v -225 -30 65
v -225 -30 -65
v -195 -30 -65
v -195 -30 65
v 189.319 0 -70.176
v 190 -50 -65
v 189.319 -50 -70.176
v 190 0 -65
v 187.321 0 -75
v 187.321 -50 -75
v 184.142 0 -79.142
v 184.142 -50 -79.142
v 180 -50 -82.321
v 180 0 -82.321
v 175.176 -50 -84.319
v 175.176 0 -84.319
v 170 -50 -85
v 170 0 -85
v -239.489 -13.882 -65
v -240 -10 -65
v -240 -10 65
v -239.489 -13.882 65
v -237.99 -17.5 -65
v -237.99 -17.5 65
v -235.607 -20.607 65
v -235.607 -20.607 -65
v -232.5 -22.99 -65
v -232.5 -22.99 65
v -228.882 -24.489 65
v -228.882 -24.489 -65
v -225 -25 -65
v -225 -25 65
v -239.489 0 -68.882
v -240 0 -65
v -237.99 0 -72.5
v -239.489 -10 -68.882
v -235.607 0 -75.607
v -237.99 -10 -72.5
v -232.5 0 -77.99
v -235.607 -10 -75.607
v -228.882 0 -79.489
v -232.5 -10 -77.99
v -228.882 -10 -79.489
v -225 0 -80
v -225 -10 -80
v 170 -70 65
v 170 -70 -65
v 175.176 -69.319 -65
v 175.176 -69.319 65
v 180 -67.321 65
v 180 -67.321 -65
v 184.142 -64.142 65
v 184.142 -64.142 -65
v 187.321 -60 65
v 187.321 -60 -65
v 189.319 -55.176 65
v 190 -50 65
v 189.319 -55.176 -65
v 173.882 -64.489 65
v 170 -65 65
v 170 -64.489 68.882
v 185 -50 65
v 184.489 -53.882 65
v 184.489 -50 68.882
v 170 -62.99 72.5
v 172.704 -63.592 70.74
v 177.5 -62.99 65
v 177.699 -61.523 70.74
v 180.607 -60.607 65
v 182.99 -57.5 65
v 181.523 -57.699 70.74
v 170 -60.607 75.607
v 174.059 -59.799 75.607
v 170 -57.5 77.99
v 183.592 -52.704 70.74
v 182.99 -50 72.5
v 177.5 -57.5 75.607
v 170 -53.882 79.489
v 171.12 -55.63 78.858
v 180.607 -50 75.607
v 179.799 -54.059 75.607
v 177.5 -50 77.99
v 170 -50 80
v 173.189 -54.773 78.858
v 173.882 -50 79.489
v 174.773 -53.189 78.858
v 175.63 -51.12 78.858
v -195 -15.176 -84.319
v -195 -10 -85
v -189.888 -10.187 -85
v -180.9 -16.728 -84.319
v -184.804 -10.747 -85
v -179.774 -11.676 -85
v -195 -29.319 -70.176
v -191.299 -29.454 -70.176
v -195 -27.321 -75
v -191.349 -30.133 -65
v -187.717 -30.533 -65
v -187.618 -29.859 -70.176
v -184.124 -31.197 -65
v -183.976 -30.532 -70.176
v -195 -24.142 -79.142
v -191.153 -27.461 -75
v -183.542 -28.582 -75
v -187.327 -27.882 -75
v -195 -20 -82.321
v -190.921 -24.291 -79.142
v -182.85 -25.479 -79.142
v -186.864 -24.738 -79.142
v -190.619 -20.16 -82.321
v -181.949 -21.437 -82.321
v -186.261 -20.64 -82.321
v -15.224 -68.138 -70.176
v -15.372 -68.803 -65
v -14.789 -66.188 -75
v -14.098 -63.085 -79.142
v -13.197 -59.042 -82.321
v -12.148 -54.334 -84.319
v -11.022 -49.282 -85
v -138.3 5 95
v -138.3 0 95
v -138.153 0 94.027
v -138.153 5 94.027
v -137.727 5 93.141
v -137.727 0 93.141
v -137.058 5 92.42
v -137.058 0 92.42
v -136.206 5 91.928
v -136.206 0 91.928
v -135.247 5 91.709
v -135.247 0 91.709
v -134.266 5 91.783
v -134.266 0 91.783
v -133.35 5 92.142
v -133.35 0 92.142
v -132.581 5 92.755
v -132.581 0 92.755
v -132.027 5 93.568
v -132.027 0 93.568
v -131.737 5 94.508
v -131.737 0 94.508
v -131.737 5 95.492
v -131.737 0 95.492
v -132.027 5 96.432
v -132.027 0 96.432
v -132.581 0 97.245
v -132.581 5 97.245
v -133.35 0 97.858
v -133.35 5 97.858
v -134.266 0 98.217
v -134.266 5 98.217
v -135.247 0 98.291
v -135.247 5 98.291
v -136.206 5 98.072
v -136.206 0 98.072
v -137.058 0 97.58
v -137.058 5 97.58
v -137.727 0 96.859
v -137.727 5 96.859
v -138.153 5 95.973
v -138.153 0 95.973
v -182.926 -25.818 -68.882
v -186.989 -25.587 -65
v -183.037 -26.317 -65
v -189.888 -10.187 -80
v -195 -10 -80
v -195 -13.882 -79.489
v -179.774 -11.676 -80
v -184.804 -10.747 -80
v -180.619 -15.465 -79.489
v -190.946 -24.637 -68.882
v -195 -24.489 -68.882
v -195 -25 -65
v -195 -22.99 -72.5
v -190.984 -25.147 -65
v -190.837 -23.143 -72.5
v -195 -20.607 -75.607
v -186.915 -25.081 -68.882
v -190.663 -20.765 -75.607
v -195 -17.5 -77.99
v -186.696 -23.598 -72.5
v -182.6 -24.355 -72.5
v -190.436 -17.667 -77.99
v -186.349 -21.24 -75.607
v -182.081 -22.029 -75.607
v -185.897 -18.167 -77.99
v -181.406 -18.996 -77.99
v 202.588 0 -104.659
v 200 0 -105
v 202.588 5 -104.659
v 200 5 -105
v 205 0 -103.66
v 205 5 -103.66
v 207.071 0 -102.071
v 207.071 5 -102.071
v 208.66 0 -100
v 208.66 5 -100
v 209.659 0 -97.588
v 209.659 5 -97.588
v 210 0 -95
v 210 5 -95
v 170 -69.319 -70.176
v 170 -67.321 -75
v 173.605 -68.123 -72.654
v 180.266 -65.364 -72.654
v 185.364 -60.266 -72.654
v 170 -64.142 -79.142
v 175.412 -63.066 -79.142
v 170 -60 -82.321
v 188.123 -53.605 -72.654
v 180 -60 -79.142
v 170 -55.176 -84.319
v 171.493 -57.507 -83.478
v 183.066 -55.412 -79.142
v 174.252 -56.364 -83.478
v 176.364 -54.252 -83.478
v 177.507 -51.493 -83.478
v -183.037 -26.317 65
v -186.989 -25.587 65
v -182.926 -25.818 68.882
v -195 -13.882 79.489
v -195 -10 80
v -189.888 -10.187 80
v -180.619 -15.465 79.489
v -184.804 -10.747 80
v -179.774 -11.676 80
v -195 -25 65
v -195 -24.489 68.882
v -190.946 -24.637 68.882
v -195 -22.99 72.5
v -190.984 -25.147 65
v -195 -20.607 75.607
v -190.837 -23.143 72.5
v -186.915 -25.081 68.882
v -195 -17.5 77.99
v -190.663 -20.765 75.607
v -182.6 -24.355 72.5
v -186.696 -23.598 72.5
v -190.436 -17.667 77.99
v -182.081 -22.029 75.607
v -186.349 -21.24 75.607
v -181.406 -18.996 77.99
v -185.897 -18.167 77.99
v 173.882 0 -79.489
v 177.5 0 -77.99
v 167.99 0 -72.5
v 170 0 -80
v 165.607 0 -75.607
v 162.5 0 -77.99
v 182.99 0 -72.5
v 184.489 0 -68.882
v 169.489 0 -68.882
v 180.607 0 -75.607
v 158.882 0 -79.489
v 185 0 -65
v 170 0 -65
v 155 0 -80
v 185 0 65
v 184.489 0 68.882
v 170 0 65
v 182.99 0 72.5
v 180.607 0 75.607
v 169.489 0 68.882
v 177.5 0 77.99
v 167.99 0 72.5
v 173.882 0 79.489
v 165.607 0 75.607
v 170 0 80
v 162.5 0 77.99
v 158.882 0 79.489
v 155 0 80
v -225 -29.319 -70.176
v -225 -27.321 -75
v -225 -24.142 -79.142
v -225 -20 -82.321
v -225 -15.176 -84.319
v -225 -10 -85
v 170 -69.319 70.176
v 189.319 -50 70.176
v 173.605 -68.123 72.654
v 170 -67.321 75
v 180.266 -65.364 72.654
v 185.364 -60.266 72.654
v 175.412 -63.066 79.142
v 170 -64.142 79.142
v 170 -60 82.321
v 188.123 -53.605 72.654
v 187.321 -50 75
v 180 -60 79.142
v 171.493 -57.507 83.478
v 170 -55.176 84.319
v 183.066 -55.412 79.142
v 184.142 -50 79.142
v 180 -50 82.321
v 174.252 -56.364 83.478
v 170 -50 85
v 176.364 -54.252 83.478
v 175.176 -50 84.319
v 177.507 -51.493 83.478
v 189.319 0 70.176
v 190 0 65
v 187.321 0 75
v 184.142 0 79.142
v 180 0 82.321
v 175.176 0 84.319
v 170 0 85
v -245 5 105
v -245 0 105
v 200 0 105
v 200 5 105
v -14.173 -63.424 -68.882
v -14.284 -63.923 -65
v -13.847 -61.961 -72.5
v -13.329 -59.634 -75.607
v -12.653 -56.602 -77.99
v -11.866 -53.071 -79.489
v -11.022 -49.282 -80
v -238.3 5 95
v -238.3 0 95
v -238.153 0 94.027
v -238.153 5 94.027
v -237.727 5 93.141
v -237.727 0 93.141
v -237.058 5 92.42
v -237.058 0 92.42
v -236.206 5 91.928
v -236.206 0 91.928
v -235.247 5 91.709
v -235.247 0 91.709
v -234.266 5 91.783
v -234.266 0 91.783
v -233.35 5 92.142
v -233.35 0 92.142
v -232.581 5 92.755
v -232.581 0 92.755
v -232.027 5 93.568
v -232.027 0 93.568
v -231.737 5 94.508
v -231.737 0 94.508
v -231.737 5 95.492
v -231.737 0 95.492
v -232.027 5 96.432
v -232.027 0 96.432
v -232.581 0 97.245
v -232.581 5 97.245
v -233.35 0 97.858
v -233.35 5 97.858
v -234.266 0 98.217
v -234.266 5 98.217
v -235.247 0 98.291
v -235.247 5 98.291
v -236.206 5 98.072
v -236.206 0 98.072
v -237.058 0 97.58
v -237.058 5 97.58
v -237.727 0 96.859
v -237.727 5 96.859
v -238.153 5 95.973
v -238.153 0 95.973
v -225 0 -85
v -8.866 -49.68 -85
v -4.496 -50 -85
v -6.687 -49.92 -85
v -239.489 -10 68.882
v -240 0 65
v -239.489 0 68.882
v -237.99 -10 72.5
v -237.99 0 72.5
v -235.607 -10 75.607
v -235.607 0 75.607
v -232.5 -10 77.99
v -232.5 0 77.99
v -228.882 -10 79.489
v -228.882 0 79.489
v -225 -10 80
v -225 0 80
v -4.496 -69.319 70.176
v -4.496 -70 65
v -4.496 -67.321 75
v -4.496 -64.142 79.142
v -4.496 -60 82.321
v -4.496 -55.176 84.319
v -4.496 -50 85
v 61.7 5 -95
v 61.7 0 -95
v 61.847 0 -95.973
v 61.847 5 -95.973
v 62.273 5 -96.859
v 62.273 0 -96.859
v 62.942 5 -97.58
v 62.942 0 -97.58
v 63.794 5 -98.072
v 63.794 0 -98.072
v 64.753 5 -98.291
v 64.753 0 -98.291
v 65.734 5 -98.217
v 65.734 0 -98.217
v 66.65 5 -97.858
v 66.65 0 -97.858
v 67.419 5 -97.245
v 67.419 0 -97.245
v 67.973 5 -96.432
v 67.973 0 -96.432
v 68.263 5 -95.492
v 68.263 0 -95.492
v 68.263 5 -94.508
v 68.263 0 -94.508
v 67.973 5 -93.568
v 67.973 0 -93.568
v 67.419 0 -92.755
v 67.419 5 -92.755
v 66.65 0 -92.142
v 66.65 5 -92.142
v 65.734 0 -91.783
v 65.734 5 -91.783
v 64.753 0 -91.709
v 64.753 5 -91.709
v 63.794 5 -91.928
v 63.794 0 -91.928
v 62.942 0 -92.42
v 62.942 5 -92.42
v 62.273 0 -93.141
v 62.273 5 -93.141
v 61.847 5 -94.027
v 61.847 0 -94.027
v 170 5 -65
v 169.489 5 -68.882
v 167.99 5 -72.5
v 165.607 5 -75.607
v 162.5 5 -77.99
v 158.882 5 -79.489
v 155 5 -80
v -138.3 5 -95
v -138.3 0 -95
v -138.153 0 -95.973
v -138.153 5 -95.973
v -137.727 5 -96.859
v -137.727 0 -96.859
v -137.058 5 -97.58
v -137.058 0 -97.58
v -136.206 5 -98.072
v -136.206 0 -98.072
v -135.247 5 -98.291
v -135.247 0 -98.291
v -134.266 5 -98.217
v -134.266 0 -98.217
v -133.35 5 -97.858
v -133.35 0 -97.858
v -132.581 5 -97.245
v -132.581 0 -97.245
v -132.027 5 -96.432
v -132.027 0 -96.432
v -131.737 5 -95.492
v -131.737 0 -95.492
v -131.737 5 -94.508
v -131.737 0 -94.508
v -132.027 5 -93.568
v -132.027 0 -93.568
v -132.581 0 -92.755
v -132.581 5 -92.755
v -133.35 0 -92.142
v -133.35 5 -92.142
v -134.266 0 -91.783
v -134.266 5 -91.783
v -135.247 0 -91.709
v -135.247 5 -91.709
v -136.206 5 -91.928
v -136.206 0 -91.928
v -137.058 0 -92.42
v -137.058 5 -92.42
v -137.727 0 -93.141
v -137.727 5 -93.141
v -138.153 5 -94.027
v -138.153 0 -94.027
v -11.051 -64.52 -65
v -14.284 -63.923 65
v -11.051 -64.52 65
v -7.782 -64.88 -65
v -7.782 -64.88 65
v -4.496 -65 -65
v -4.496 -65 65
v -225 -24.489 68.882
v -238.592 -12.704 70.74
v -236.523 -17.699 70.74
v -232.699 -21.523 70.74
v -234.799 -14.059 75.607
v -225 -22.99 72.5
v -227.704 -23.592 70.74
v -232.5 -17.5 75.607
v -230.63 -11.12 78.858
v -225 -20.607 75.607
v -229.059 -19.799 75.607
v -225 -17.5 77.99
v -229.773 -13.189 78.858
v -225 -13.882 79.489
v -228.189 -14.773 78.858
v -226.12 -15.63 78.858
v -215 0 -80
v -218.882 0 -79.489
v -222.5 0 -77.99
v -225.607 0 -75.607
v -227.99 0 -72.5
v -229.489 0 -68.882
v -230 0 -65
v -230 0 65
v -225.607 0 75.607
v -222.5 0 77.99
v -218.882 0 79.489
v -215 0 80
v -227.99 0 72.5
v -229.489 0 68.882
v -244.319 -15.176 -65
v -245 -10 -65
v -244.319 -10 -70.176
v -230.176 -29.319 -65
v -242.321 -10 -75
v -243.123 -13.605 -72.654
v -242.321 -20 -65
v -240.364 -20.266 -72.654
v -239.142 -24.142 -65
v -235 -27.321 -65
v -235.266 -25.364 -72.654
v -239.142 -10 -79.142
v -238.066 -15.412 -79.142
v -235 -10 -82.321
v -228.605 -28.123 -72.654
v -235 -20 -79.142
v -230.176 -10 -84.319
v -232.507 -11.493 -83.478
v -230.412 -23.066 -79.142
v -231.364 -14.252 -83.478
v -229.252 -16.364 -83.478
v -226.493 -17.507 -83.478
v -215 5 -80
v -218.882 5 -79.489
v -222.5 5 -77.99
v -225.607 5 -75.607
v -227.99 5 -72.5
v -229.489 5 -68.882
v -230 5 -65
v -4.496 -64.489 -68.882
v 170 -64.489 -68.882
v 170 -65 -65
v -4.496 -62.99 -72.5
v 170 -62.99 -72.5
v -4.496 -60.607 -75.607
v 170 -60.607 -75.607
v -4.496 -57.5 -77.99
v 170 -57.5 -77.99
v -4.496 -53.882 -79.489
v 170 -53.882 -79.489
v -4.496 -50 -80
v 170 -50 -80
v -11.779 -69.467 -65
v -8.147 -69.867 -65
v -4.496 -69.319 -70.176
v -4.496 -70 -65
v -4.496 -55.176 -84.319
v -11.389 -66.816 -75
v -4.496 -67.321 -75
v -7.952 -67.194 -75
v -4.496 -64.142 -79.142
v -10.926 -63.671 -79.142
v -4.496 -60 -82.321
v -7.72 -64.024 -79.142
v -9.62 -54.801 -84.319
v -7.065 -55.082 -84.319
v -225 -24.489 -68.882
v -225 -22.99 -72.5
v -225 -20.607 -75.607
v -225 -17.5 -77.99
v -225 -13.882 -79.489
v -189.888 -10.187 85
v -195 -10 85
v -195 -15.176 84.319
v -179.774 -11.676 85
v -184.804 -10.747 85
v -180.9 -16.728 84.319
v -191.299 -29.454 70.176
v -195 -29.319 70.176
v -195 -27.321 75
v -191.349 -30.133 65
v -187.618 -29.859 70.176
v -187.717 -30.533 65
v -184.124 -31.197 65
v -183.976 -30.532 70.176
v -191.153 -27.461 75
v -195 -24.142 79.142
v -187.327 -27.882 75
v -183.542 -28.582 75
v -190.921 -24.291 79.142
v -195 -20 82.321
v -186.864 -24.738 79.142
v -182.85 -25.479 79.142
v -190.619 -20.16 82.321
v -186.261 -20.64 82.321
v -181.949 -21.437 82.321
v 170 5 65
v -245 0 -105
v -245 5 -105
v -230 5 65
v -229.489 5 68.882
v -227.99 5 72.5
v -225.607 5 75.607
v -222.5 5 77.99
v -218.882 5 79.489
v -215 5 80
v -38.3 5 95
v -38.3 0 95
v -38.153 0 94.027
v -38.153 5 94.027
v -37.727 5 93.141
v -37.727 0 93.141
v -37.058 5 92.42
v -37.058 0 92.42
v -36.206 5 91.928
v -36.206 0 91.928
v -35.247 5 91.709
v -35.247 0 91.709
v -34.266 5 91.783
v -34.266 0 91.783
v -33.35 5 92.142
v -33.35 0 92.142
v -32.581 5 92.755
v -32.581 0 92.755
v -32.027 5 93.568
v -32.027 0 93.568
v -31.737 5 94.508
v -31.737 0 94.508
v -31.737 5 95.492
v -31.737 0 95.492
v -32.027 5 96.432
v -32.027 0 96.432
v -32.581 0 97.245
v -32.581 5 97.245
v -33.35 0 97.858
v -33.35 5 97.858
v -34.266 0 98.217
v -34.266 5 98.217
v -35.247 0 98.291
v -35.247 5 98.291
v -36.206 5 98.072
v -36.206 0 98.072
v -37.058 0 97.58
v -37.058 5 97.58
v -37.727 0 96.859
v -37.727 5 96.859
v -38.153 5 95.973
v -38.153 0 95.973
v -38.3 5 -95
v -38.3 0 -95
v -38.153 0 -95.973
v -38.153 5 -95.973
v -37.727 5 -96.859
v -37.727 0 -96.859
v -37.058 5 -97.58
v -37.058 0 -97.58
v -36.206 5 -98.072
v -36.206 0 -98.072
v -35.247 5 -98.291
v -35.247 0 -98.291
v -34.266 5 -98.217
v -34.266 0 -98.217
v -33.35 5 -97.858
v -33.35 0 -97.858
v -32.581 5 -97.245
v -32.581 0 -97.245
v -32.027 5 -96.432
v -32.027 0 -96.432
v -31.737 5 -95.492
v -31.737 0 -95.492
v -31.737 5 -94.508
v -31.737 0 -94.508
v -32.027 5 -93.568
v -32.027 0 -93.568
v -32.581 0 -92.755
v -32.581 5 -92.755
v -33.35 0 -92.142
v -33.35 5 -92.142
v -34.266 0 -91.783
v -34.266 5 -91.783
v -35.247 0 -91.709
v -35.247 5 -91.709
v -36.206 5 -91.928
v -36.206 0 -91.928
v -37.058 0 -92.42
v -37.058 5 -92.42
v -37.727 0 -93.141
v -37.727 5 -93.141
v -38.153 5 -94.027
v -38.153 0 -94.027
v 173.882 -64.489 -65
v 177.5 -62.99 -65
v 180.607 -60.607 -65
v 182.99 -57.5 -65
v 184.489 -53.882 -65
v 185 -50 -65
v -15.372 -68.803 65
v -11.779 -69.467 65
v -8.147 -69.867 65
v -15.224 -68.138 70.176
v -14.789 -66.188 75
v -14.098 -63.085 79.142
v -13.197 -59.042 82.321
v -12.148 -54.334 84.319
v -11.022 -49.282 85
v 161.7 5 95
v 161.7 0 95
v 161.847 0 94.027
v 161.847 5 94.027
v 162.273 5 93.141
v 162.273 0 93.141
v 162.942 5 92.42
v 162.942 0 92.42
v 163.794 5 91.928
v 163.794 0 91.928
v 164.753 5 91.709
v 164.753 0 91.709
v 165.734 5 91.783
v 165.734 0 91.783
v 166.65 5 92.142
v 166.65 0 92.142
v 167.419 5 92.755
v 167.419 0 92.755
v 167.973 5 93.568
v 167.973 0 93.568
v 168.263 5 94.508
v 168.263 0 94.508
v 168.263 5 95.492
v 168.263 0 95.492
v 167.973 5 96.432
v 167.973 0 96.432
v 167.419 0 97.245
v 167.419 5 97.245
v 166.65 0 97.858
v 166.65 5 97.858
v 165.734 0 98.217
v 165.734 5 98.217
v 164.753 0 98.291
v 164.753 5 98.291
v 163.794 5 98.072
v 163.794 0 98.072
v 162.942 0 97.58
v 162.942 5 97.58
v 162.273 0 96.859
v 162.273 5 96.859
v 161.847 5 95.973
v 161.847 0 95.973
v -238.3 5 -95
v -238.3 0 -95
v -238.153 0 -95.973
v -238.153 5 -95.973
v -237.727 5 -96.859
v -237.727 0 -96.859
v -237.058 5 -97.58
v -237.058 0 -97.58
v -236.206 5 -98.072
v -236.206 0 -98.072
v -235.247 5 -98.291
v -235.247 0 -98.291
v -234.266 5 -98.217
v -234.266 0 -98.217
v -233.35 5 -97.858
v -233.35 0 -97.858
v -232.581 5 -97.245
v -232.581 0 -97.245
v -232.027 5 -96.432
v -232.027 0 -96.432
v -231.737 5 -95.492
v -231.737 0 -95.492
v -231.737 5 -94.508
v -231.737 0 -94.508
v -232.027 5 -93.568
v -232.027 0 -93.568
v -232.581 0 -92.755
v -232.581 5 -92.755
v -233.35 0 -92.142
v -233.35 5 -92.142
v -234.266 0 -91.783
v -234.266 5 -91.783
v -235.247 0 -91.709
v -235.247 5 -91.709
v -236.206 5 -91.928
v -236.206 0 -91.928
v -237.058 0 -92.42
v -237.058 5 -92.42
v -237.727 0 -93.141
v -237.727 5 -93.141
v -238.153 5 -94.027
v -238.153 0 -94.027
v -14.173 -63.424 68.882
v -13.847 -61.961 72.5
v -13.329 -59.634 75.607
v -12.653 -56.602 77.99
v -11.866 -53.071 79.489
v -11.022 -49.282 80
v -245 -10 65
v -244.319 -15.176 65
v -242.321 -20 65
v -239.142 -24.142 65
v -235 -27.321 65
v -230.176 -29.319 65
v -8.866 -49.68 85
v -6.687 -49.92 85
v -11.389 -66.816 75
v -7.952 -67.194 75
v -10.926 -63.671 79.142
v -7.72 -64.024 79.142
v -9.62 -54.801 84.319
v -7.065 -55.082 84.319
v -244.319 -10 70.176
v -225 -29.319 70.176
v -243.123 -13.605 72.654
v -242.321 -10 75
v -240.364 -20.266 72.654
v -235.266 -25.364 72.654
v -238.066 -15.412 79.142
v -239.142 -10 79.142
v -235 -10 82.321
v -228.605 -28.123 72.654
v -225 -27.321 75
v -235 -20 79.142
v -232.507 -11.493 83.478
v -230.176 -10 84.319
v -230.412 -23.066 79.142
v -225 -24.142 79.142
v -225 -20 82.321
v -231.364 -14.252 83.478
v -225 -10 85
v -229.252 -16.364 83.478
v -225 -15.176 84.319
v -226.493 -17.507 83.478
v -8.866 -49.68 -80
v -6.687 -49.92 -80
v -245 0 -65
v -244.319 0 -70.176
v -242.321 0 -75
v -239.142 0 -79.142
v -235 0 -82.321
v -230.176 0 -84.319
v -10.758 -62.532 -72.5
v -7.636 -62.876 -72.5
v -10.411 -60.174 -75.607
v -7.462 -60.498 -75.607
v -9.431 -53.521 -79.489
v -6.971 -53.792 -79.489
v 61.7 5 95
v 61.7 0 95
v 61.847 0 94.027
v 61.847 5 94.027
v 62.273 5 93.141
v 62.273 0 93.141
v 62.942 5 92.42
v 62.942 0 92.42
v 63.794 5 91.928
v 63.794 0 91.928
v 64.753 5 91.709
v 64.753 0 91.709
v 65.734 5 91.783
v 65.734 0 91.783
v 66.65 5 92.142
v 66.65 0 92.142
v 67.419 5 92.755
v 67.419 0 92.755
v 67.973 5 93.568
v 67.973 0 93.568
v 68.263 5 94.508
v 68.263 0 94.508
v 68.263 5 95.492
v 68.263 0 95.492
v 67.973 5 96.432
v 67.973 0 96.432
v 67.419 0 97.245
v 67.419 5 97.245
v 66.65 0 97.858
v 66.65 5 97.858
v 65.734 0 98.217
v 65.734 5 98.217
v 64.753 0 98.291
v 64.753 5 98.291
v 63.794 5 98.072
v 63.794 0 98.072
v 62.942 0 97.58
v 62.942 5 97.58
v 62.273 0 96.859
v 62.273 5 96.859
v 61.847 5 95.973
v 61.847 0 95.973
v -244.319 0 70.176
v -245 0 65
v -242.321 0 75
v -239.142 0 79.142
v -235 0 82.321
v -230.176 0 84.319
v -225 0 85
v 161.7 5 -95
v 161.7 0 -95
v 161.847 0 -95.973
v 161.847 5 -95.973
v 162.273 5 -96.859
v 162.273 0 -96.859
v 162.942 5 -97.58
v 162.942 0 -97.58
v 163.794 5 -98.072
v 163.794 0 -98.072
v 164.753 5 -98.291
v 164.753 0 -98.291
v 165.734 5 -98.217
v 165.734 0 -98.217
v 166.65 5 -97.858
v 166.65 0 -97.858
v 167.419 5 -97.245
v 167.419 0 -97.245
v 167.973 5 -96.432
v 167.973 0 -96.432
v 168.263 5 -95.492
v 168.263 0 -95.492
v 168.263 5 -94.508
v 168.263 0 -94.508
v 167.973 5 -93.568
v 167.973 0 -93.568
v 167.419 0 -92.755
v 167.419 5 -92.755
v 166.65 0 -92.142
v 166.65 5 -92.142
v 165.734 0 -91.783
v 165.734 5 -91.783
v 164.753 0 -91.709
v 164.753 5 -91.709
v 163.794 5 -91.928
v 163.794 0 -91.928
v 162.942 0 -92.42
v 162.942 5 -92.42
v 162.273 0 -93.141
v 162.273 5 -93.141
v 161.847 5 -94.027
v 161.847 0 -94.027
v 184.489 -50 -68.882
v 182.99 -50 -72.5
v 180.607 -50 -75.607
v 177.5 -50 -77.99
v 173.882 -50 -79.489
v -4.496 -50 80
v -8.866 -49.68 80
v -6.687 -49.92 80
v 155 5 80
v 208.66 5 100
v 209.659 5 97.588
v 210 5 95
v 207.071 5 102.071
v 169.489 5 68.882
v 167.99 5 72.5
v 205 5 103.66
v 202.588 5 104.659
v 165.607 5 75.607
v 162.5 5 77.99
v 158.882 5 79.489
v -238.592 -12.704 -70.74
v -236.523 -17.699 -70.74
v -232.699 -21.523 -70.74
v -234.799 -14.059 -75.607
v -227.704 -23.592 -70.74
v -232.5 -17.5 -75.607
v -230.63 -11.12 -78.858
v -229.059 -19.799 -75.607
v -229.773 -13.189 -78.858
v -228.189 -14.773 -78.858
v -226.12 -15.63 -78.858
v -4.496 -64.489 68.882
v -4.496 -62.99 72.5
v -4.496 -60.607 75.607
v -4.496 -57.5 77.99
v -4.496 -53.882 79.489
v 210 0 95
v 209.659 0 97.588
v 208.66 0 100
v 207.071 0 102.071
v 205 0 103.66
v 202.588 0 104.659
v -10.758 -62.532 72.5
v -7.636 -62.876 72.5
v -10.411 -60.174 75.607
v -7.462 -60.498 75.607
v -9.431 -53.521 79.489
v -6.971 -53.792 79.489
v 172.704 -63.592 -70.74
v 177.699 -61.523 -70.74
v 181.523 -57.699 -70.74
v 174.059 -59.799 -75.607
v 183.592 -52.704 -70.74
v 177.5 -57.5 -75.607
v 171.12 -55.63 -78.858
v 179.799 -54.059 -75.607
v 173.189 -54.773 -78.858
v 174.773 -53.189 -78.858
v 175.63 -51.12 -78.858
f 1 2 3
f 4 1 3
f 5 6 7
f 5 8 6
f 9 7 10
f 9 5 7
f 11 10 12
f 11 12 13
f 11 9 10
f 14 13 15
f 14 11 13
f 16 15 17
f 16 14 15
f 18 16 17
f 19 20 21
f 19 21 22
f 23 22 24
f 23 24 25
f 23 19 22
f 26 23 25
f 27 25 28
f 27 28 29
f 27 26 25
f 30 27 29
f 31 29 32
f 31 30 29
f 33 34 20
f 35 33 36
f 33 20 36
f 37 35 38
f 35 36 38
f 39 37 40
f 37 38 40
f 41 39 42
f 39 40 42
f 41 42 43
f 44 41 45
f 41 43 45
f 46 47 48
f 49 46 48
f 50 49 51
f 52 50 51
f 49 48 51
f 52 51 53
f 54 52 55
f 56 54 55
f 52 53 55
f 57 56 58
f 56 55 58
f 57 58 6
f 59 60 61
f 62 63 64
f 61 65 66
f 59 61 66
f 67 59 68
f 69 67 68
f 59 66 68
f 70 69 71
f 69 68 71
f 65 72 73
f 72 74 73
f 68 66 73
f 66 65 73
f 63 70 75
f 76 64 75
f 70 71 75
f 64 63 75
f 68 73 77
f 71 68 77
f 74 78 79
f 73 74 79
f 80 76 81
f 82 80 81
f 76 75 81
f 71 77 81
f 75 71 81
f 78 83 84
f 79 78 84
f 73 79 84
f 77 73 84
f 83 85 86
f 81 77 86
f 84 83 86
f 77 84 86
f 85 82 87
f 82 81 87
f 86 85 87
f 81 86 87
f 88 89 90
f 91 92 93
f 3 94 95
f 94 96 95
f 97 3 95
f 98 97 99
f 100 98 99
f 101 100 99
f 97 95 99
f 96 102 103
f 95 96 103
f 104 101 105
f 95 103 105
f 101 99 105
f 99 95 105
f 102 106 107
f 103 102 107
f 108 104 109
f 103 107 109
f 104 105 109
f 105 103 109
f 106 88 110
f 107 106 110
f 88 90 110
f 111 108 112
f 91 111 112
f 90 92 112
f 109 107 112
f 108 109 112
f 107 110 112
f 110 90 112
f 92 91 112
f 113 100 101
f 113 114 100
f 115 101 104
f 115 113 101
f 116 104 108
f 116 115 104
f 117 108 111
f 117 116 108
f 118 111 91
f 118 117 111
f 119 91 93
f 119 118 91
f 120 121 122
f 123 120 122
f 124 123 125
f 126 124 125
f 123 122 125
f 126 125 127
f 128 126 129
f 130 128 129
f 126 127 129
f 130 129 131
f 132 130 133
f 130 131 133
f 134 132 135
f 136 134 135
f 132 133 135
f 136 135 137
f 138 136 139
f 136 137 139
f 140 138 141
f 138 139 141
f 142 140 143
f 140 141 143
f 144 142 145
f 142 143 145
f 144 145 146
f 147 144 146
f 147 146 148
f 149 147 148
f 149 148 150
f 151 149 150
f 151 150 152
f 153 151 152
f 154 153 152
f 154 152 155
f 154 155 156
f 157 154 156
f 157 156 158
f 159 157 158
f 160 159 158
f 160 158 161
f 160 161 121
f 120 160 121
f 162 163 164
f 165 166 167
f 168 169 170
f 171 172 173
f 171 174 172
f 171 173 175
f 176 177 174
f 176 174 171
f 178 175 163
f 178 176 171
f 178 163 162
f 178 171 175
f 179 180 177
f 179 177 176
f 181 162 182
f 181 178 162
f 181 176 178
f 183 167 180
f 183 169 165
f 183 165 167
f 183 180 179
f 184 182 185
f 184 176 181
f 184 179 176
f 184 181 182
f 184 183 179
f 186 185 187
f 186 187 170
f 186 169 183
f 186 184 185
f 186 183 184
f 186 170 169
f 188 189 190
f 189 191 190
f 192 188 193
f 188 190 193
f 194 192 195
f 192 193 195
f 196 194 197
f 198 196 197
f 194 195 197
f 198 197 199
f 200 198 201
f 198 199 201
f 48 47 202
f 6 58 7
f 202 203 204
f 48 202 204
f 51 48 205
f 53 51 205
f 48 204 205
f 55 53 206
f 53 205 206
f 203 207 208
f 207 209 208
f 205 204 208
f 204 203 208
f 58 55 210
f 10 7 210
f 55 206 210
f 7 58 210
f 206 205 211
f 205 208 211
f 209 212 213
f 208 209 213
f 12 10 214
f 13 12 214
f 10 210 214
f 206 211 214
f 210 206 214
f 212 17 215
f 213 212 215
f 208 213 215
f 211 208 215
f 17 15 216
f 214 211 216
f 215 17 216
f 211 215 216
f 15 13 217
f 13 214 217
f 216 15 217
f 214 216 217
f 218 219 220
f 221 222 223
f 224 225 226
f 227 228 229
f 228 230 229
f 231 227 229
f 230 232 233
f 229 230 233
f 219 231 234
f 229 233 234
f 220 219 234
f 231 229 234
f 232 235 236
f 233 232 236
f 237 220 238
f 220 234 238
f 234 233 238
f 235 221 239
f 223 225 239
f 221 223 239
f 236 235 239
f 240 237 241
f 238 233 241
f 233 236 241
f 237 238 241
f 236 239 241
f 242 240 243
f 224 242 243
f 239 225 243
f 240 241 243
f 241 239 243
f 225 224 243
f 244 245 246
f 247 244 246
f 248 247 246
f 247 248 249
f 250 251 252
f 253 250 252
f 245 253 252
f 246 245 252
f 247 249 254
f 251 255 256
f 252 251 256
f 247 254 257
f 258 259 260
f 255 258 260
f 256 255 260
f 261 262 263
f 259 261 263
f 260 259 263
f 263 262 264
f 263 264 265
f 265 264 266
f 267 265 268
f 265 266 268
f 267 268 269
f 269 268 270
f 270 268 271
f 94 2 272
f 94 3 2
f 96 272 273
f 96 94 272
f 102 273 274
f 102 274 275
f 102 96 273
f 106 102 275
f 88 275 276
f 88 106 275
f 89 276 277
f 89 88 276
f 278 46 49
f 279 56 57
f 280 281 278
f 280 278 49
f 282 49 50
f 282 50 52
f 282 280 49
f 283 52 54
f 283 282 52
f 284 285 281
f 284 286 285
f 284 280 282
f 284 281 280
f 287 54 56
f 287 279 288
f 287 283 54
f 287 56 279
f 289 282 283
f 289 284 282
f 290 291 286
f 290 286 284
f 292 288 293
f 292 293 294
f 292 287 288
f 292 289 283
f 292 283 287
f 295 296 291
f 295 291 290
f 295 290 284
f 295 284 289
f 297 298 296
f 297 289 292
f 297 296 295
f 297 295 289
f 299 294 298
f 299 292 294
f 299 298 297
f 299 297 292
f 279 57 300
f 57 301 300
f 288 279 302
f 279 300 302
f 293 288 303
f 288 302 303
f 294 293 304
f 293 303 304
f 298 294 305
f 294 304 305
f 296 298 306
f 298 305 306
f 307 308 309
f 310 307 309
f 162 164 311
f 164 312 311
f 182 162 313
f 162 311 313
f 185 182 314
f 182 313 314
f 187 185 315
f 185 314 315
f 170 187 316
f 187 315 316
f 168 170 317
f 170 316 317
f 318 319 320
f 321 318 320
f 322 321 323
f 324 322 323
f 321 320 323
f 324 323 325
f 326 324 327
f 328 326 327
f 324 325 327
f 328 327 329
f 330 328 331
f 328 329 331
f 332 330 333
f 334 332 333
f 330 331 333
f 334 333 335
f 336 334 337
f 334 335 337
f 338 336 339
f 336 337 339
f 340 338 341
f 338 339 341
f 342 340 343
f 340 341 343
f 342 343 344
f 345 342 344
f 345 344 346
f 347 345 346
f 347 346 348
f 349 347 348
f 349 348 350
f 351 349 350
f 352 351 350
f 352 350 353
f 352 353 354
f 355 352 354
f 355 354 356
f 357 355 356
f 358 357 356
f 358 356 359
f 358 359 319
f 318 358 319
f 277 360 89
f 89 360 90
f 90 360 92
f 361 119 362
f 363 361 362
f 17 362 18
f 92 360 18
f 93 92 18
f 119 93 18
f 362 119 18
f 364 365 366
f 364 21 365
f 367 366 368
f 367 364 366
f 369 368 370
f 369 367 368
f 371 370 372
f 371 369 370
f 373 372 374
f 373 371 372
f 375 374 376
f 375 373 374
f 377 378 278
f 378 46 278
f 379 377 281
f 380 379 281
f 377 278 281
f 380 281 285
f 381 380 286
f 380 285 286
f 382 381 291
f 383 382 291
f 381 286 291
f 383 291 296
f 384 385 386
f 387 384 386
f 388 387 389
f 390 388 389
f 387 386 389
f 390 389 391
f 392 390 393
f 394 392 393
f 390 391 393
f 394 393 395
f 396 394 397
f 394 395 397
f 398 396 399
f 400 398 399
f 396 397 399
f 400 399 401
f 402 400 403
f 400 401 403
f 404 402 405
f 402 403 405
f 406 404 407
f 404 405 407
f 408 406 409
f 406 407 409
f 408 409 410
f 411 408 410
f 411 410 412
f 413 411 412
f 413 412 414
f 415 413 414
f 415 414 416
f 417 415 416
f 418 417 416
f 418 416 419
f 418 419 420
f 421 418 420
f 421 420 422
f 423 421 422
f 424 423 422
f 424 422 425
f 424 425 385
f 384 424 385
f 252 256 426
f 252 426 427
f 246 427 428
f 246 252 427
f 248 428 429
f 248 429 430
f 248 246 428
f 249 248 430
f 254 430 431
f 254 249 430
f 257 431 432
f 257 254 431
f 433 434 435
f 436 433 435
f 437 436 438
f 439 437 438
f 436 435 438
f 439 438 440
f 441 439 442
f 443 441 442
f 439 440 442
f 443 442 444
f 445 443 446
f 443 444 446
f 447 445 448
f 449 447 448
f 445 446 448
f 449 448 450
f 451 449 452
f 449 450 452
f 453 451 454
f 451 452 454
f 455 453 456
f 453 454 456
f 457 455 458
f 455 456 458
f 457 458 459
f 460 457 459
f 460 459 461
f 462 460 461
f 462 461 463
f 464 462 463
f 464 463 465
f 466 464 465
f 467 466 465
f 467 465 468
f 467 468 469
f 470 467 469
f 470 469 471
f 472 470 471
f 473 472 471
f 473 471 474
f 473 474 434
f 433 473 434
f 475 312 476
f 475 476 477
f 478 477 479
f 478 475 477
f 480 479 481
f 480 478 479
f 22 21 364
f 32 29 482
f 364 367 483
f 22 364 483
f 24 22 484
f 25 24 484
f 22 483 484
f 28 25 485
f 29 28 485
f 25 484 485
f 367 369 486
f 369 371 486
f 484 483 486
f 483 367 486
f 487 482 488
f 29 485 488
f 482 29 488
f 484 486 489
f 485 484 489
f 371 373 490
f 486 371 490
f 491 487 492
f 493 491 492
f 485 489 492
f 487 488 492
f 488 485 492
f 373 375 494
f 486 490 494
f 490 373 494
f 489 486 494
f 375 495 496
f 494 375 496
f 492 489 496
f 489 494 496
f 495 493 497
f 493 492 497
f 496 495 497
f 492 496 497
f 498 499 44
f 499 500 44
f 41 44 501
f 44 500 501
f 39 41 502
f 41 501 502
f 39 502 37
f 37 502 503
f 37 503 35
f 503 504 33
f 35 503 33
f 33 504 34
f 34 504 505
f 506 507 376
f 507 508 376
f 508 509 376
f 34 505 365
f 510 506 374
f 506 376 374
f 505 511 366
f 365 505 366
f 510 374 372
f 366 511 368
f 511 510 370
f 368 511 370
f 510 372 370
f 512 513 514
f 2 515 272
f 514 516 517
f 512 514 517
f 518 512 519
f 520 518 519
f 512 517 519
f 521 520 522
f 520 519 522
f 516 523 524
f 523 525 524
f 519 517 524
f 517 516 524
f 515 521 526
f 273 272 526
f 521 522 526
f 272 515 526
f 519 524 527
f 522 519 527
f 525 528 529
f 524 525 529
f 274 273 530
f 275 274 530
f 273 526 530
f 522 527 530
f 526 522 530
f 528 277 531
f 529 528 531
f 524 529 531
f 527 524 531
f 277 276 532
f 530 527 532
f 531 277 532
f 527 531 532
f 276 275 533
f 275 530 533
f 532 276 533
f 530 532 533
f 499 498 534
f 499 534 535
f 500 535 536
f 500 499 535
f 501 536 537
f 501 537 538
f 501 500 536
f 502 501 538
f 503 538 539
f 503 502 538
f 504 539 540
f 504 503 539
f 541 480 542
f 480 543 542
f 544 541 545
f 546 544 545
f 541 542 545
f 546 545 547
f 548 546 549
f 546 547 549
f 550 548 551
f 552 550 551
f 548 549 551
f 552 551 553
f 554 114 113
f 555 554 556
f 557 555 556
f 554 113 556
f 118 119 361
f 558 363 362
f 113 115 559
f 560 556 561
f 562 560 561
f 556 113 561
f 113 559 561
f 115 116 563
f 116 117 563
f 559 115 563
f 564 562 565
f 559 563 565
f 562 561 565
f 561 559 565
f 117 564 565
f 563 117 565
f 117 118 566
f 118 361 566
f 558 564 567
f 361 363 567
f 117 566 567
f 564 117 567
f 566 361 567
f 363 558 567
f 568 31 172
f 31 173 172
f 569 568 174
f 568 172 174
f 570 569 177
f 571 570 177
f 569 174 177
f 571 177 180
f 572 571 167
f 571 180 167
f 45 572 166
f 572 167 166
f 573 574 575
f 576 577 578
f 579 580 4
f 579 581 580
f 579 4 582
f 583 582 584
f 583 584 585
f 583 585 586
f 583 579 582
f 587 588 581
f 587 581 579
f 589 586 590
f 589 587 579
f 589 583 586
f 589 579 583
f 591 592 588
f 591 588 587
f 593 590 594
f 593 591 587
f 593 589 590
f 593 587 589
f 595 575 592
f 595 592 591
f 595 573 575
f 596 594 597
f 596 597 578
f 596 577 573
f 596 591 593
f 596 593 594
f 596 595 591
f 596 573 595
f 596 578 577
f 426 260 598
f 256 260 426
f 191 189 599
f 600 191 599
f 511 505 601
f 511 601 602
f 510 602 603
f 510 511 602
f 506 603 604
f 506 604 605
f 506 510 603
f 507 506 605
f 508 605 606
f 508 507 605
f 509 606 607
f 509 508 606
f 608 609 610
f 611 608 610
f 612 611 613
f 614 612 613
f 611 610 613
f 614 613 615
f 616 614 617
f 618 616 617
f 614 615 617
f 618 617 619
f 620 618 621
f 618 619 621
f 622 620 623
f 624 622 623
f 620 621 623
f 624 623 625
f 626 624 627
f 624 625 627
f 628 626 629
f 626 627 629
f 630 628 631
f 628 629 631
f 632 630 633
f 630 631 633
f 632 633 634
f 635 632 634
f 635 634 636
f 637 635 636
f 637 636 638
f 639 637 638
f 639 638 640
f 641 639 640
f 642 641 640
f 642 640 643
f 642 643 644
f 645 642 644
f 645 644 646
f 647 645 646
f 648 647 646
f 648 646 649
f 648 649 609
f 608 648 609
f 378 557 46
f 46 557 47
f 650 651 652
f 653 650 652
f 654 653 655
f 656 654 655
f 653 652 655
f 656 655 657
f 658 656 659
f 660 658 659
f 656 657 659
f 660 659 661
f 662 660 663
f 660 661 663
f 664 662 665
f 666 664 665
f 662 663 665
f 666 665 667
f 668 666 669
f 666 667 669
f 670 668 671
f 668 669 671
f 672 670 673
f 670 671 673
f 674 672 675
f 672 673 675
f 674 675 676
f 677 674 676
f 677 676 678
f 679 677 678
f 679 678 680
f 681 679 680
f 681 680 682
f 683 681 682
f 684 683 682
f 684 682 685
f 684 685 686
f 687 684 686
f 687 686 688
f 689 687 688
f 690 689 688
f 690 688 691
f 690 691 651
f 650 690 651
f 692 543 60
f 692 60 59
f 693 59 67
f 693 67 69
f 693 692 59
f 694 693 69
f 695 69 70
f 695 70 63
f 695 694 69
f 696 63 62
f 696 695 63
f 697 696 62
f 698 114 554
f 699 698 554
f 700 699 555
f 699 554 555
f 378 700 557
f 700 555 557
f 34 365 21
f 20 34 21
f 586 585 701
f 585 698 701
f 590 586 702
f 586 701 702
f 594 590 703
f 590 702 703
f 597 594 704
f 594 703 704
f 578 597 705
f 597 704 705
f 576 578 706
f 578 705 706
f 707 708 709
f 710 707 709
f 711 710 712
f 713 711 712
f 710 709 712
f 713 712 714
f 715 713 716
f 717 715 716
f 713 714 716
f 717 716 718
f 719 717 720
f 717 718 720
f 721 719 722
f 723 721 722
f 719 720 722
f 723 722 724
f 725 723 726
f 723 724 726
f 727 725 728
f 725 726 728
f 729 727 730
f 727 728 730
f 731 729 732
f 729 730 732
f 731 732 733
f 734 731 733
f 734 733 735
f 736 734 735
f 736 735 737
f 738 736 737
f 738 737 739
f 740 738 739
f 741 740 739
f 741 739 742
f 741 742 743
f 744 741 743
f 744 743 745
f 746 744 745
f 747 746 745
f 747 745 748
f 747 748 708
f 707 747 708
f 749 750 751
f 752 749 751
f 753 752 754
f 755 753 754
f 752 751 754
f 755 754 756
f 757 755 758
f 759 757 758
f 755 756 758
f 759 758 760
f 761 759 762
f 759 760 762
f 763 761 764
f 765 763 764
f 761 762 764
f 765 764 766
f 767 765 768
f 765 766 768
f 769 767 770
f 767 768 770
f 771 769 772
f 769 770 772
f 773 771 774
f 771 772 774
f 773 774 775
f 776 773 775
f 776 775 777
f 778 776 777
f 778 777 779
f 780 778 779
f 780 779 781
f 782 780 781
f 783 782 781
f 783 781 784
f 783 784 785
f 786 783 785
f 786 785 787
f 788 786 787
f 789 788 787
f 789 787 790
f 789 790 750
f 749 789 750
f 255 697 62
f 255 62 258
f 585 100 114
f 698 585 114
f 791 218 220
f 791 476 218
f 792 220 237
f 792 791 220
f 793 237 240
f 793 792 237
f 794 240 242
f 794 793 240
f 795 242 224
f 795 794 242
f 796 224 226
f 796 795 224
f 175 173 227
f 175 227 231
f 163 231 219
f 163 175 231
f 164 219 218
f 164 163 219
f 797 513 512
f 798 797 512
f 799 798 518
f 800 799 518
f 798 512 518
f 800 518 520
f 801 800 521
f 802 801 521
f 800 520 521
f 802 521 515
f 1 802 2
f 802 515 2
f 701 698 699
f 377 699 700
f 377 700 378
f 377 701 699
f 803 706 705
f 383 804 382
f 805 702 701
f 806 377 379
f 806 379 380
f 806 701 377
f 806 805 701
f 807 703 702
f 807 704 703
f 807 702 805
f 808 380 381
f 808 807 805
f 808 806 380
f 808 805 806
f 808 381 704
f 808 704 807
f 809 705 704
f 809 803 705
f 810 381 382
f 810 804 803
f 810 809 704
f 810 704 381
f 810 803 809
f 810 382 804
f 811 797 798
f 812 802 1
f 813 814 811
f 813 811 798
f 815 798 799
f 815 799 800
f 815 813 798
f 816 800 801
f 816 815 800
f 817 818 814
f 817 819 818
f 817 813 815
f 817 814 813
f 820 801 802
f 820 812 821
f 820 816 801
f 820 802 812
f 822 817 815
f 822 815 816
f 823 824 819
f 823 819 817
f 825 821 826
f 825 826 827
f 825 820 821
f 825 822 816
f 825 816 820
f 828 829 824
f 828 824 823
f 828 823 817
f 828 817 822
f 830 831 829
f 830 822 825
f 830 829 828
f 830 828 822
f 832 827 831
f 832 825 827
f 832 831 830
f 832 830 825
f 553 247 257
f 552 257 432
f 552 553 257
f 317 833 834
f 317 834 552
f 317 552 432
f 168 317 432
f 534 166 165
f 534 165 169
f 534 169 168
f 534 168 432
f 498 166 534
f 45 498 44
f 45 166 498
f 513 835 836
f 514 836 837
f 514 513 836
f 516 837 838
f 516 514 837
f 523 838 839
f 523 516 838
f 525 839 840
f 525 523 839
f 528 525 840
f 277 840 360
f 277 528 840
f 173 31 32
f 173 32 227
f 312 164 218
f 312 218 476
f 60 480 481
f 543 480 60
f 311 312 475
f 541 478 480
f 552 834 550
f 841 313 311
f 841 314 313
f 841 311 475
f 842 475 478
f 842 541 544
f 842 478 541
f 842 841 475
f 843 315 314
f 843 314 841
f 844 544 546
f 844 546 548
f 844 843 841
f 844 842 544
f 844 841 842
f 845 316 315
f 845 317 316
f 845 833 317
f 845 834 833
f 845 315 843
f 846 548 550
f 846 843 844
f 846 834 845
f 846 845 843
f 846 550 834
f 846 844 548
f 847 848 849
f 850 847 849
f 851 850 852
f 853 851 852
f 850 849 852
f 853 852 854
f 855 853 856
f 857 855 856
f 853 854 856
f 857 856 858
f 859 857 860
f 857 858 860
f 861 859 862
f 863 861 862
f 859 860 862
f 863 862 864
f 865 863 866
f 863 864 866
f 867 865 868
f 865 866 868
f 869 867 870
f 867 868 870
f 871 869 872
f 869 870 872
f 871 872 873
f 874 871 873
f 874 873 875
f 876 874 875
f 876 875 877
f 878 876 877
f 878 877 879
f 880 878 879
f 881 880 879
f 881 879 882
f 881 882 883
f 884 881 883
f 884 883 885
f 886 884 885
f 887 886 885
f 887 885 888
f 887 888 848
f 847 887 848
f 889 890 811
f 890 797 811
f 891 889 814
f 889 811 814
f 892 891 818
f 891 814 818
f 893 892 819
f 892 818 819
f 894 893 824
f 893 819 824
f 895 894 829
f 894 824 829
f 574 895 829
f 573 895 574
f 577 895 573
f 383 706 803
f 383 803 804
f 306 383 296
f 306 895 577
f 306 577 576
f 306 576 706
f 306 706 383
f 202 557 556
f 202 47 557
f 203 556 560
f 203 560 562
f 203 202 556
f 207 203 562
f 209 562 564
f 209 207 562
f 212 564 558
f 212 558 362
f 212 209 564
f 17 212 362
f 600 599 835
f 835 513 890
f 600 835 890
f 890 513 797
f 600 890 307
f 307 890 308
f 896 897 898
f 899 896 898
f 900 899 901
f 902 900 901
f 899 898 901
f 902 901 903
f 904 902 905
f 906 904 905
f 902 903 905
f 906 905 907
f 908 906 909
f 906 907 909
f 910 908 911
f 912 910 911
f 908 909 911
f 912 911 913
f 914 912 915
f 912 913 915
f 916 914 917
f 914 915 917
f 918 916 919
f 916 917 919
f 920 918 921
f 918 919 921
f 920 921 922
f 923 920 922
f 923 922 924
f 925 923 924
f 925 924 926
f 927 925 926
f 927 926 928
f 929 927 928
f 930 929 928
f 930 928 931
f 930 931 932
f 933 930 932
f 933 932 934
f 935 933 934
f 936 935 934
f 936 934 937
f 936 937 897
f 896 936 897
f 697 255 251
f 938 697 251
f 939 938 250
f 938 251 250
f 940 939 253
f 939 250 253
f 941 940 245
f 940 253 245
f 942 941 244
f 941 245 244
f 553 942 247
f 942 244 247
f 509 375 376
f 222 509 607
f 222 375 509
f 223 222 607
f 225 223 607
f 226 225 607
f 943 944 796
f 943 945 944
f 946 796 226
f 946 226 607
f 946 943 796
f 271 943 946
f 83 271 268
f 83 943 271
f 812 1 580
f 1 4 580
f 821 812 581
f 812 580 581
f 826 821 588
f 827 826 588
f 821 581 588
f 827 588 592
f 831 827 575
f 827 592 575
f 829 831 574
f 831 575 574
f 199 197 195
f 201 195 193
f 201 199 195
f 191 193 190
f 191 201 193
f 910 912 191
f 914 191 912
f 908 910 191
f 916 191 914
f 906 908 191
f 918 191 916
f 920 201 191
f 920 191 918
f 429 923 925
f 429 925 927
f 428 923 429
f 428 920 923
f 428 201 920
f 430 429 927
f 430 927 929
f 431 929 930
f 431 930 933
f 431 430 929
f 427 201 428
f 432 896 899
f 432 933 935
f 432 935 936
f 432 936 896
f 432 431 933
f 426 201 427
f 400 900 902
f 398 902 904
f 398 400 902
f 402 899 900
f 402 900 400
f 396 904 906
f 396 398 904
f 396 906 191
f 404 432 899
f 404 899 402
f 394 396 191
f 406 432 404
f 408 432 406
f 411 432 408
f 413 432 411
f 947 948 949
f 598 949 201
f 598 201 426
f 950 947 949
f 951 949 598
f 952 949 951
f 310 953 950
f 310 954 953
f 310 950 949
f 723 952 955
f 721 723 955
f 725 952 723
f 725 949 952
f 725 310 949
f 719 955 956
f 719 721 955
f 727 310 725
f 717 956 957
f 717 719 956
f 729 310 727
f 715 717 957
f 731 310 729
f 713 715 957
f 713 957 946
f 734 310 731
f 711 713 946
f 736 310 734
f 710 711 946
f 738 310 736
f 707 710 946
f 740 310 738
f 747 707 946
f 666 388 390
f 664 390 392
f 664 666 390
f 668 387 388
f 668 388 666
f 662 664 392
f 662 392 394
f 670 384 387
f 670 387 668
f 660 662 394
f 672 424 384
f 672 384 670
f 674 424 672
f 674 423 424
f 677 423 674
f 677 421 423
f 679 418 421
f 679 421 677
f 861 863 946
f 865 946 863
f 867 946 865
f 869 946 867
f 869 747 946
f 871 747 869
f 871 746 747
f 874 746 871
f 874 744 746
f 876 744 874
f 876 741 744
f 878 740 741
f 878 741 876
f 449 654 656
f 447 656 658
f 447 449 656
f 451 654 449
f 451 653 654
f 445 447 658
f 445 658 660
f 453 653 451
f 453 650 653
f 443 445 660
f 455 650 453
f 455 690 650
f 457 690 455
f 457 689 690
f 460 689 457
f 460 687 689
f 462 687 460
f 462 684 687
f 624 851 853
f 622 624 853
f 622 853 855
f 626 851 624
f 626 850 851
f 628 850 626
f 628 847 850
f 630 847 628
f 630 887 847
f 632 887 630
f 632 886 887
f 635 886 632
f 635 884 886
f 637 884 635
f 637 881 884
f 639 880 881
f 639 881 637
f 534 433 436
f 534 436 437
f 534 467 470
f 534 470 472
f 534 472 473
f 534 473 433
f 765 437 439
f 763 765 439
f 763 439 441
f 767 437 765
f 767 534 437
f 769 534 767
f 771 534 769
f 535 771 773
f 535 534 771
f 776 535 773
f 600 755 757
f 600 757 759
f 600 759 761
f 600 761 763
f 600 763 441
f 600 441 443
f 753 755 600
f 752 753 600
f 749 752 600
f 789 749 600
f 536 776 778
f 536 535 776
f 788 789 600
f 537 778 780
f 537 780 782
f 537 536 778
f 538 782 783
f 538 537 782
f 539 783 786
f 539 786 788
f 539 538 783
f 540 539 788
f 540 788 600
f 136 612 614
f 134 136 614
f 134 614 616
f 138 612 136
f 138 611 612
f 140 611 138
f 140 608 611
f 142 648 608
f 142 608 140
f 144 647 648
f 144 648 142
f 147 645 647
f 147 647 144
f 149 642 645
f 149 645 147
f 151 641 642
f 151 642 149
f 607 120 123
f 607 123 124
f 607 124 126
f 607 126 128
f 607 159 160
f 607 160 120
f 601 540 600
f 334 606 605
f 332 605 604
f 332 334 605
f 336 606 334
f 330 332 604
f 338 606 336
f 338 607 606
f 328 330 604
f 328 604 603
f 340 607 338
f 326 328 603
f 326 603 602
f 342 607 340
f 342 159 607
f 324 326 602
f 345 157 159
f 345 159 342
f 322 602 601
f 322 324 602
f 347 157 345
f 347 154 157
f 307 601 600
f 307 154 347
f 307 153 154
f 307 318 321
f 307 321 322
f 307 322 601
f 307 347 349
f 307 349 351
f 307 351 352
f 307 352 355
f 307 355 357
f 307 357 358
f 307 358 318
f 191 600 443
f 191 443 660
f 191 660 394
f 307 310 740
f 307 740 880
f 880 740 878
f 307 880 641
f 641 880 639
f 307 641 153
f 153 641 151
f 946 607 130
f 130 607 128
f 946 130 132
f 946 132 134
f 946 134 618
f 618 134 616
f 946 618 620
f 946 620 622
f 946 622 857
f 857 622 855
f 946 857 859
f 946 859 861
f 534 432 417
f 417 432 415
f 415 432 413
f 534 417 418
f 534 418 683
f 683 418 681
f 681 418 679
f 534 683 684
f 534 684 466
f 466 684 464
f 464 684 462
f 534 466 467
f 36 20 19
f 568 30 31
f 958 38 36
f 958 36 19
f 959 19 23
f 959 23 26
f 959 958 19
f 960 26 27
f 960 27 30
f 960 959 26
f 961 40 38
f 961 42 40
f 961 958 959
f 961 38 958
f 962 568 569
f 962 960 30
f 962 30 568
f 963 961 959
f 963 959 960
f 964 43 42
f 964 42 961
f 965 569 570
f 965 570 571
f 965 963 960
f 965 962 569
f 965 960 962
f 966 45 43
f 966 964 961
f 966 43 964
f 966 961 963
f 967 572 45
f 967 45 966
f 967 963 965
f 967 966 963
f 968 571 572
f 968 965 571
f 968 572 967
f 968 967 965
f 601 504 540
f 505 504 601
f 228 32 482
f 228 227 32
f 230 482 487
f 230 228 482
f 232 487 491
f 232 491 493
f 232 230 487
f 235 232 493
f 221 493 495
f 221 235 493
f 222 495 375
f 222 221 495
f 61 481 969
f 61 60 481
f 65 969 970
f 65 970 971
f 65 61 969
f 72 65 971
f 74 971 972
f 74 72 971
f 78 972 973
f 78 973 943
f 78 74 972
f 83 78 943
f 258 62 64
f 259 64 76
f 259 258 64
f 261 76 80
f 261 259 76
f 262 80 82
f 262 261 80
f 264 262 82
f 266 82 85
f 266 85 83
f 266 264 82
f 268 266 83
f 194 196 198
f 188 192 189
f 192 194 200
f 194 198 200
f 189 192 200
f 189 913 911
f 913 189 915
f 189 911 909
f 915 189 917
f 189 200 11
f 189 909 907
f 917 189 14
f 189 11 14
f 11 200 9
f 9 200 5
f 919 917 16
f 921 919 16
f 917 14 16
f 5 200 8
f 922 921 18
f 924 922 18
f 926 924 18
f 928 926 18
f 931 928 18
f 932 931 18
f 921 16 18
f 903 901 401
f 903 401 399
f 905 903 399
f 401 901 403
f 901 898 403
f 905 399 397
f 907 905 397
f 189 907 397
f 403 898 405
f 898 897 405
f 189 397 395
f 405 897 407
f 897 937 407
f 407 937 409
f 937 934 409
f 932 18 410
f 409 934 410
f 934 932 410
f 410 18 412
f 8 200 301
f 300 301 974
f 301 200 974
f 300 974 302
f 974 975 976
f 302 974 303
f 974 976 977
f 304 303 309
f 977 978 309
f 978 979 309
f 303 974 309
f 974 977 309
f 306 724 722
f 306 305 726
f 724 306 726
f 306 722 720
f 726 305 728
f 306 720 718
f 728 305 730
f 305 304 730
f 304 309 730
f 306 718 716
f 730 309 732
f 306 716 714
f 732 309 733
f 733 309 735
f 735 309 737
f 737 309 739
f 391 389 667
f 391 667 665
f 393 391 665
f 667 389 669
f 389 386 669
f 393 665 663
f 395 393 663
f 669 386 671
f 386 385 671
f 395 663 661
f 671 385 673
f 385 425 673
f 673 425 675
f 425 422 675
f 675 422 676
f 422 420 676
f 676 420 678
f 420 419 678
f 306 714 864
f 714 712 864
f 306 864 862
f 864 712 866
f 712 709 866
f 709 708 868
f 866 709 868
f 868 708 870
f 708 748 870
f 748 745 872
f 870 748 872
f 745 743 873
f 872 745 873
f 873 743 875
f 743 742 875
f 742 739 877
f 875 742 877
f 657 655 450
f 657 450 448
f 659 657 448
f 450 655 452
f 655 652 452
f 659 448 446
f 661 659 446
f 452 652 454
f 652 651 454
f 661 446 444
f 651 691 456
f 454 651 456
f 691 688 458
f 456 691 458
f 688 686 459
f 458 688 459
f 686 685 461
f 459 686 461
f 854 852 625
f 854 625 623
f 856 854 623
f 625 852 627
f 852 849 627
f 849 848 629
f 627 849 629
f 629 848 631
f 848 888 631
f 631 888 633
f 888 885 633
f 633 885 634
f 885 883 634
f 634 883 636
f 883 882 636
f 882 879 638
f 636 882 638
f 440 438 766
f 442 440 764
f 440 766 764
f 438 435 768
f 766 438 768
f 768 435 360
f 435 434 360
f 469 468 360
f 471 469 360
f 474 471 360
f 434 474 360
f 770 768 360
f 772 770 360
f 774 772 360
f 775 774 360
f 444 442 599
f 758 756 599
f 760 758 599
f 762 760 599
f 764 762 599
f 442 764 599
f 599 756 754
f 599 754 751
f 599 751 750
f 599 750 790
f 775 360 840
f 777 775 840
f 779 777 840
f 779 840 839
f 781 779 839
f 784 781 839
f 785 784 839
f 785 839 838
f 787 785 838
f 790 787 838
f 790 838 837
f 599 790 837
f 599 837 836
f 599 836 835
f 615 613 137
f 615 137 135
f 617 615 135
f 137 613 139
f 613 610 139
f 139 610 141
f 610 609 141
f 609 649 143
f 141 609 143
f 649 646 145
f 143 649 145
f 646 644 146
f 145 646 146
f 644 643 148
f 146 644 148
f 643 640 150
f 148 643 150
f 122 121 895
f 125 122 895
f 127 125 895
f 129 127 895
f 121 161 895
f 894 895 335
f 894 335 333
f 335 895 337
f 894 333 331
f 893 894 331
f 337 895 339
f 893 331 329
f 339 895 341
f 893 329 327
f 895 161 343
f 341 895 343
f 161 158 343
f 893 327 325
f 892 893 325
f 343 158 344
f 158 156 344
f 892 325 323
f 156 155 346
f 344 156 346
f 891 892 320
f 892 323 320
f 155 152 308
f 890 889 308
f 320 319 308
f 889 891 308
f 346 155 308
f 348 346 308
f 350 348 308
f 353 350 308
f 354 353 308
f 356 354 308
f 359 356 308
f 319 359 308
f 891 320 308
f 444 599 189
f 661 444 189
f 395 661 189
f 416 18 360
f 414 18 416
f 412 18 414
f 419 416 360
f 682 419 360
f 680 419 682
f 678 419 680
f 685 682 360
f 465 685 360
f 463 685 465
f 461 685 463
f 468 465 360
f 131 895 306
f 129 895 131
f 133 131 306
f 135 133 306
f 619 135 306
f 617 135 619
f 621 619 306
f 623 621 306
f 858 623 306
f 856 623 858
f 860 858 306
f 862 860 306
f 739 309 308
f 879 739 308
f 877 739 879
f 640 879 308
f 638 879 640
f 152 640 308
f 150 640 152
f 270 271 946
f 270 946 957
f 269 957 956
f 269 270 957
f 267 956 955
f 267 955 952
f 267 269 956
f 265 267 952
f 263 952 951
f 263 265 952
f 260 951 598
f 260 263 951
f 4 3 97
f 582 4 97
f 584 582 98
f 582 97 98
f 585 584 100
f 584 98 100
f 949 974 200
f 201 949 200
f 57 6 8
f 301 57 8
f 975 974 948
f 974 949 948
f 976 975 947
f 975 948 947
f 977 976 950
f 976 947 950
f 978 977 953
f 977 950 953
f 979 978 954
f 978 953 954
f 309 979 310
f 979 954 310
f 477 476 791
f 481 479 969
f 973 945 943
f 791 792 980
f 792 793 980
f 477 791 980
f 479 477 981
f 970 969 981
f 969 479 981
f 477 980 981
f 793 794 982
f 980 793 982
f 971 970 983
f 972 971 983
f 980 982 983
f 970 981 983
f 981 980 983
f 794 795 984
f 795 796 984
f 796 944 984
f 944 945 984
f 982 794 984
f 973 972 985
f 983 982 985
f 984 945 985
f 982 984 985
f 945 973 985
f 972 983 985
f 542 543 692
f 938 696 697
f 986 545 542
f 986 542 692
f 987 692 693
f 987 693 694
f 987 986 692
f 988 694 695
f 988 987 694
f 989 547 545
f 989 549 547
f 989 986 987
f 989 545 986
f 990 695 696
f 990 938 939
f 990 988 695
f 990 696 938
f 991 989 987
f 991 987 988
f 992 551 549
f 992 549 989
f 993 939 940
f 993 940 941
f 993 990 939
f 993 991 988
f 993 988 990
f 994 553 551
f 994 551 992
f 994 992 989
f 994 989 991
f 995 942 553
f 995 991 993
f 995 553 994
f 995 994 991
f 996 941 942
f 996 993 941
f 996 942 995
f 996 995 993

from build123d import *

# Parameters (mm, degrees)
BOSS_EXTRUDE2_DEPTH      = 85
BOSS_EXTRUDE2_DEPTH_BACK = 85
FILLET1_R                = 20
SHELL1_T                 = -5
BOSS_EXTRUDE3_DEPTH      = 5
M6_CLEARANCE_HOLE1_D     = 6.6
FILLET2_R                = 10


with BuildPart() as part:
    # Sketch4 → Boss-Extrude2 (new, two sides: drawn at the far end of the back side and taken through both)
    with BuildSketch(Plane.XY.offset(-BOSS_EXTRUDE2_DEPTH_BACK)):
        with BuildLine():
            Line((-245, 0), (-245, -10))
            ThreePointArc((-245, -10), (-239.142135624, -24.142135624), (-225, -30))
            Line((-225, -30), (-195, -30))
            ThreePointArc((-195, -30), (-189.529397686, -30.300175953), (-184.124481103, -31.197099587))
            Line((-184.124481103, -31.197099587), (-15.371875354, -68.802900413))
            ThreePointArc((-15.371875354, -68.802900413), (-9.966958771, -69.699824047), (-4.496356458, -70))
            Line((-4.496356458, -70), (170, -70))
            ThreePointArc((170, -70), (184.142135624, -64.142135624), (190, -50))
            Line((190, -50), (190, 0))
            Line((190, 0), (-245, 0))
        make_face()
    extrude(amount=BOSS_EXTRUDE2_DEPTH + BOSS_EXTRUDE2_DEPTH_BACK)

    # Fillet1
    fillet1_edges = [part.edges().sort_by_distance(p)[0] for p in [
        (-239.142135624, -24.142135624, -85),
        (-210, -30, -85),
        (-189.529397686, -30.300175953, -85),
        (-99.748178229, -50, -85),
        (-9.966958771, -69.699824047, -85),
        (-245, -5, 85),
        (-239.142135624, -24.142135624, 85),
        (-210, -30, 85),
        (-189.529397686, -30.300175953, 85),
        (-99.748178229, -50, 85),
        (-9.966958771, -69.699824047, 85),
        (82.751821771, -70, 85),
        (184.142135624, -64.142135624, 85),
        (190, -25, 85),
        (82.751821771, -70, -85),
        (184.142135624, -64.142135624, -85),
        (190, -25, -85),
        (-245, -5, -85),
    ]]
    fillet(fillet1_edges, radius=FILLET1_R)

    # Shell1
    shell1_openings = [part.faces().sort_by_distance(p)[0] for p in [
        (-27.5, 0, 0),
    ]]
    offset(amount=SHELL1_T, openings=shell1_openings, kind=Kind.INTERSECTION)

    # Sketch1 → Boss-Extrude3 (add)
    with BuildSketch(Plane(origin=(0, 0, 0), x_dir=(-1, 0, 0), z_dir=(0, 1, 0))):
        Polygon((-210, 35), (-210, -35), (-210, -105), (245, -105), (245, 105), (-210, 105), align=None)
        with BuildLine():
            Line((-170, 35), (-170, -35))
            Line((-170, -35), (-170, -65))
            ThreePointArc((-170, -65), (-165.606601718, -75.606601718), (-155, -80))
            Line((-155, -80), (215, -80))
            ThreePointArc((215, -80), (225.606601718, -75.606601718), (230, -65))
            Line((230, -65), (230, 65))
            ThreePointArc((230, 65), (225.606601718, 75.606601718), (215, 80))
            Line((215, 80), (-155, 80))
            ThreePointArc((-155, 80), (-165.606601718, 75.606601718), (-170, 65))
            Line((-170, 65), (-170, 35))
        make_face(mode=Mode.SUBTRACT)
    extrude(amount=BOSS_EXTRUDE3_DEPTH)

    # M6 Clearance Hole1 (through all)
    with Locations(Plane(origin=(0, 5, 0), x_dir=(1, 0, 0), z_dir=(0, 1, 0))):
        with Locations((165, -95), (65, -95), (-35, -95), (-135, -95), (-235, -95), (-235, 95), (-135, 95), (-35, 95), (65, 95), (165, 95)):
            Hole(M6_CLEARANCE_HOLE1_D / 2)

    # Fillet2
    fillet2_edges = [part.edges().sort_by_distance(p)[0] for p in [
        (210, 2.5, 105),
        (210, 2.5, -105),
    ]]
    fillet(fillet2_edges, radius=FILLET2_R)


solid = part.part
